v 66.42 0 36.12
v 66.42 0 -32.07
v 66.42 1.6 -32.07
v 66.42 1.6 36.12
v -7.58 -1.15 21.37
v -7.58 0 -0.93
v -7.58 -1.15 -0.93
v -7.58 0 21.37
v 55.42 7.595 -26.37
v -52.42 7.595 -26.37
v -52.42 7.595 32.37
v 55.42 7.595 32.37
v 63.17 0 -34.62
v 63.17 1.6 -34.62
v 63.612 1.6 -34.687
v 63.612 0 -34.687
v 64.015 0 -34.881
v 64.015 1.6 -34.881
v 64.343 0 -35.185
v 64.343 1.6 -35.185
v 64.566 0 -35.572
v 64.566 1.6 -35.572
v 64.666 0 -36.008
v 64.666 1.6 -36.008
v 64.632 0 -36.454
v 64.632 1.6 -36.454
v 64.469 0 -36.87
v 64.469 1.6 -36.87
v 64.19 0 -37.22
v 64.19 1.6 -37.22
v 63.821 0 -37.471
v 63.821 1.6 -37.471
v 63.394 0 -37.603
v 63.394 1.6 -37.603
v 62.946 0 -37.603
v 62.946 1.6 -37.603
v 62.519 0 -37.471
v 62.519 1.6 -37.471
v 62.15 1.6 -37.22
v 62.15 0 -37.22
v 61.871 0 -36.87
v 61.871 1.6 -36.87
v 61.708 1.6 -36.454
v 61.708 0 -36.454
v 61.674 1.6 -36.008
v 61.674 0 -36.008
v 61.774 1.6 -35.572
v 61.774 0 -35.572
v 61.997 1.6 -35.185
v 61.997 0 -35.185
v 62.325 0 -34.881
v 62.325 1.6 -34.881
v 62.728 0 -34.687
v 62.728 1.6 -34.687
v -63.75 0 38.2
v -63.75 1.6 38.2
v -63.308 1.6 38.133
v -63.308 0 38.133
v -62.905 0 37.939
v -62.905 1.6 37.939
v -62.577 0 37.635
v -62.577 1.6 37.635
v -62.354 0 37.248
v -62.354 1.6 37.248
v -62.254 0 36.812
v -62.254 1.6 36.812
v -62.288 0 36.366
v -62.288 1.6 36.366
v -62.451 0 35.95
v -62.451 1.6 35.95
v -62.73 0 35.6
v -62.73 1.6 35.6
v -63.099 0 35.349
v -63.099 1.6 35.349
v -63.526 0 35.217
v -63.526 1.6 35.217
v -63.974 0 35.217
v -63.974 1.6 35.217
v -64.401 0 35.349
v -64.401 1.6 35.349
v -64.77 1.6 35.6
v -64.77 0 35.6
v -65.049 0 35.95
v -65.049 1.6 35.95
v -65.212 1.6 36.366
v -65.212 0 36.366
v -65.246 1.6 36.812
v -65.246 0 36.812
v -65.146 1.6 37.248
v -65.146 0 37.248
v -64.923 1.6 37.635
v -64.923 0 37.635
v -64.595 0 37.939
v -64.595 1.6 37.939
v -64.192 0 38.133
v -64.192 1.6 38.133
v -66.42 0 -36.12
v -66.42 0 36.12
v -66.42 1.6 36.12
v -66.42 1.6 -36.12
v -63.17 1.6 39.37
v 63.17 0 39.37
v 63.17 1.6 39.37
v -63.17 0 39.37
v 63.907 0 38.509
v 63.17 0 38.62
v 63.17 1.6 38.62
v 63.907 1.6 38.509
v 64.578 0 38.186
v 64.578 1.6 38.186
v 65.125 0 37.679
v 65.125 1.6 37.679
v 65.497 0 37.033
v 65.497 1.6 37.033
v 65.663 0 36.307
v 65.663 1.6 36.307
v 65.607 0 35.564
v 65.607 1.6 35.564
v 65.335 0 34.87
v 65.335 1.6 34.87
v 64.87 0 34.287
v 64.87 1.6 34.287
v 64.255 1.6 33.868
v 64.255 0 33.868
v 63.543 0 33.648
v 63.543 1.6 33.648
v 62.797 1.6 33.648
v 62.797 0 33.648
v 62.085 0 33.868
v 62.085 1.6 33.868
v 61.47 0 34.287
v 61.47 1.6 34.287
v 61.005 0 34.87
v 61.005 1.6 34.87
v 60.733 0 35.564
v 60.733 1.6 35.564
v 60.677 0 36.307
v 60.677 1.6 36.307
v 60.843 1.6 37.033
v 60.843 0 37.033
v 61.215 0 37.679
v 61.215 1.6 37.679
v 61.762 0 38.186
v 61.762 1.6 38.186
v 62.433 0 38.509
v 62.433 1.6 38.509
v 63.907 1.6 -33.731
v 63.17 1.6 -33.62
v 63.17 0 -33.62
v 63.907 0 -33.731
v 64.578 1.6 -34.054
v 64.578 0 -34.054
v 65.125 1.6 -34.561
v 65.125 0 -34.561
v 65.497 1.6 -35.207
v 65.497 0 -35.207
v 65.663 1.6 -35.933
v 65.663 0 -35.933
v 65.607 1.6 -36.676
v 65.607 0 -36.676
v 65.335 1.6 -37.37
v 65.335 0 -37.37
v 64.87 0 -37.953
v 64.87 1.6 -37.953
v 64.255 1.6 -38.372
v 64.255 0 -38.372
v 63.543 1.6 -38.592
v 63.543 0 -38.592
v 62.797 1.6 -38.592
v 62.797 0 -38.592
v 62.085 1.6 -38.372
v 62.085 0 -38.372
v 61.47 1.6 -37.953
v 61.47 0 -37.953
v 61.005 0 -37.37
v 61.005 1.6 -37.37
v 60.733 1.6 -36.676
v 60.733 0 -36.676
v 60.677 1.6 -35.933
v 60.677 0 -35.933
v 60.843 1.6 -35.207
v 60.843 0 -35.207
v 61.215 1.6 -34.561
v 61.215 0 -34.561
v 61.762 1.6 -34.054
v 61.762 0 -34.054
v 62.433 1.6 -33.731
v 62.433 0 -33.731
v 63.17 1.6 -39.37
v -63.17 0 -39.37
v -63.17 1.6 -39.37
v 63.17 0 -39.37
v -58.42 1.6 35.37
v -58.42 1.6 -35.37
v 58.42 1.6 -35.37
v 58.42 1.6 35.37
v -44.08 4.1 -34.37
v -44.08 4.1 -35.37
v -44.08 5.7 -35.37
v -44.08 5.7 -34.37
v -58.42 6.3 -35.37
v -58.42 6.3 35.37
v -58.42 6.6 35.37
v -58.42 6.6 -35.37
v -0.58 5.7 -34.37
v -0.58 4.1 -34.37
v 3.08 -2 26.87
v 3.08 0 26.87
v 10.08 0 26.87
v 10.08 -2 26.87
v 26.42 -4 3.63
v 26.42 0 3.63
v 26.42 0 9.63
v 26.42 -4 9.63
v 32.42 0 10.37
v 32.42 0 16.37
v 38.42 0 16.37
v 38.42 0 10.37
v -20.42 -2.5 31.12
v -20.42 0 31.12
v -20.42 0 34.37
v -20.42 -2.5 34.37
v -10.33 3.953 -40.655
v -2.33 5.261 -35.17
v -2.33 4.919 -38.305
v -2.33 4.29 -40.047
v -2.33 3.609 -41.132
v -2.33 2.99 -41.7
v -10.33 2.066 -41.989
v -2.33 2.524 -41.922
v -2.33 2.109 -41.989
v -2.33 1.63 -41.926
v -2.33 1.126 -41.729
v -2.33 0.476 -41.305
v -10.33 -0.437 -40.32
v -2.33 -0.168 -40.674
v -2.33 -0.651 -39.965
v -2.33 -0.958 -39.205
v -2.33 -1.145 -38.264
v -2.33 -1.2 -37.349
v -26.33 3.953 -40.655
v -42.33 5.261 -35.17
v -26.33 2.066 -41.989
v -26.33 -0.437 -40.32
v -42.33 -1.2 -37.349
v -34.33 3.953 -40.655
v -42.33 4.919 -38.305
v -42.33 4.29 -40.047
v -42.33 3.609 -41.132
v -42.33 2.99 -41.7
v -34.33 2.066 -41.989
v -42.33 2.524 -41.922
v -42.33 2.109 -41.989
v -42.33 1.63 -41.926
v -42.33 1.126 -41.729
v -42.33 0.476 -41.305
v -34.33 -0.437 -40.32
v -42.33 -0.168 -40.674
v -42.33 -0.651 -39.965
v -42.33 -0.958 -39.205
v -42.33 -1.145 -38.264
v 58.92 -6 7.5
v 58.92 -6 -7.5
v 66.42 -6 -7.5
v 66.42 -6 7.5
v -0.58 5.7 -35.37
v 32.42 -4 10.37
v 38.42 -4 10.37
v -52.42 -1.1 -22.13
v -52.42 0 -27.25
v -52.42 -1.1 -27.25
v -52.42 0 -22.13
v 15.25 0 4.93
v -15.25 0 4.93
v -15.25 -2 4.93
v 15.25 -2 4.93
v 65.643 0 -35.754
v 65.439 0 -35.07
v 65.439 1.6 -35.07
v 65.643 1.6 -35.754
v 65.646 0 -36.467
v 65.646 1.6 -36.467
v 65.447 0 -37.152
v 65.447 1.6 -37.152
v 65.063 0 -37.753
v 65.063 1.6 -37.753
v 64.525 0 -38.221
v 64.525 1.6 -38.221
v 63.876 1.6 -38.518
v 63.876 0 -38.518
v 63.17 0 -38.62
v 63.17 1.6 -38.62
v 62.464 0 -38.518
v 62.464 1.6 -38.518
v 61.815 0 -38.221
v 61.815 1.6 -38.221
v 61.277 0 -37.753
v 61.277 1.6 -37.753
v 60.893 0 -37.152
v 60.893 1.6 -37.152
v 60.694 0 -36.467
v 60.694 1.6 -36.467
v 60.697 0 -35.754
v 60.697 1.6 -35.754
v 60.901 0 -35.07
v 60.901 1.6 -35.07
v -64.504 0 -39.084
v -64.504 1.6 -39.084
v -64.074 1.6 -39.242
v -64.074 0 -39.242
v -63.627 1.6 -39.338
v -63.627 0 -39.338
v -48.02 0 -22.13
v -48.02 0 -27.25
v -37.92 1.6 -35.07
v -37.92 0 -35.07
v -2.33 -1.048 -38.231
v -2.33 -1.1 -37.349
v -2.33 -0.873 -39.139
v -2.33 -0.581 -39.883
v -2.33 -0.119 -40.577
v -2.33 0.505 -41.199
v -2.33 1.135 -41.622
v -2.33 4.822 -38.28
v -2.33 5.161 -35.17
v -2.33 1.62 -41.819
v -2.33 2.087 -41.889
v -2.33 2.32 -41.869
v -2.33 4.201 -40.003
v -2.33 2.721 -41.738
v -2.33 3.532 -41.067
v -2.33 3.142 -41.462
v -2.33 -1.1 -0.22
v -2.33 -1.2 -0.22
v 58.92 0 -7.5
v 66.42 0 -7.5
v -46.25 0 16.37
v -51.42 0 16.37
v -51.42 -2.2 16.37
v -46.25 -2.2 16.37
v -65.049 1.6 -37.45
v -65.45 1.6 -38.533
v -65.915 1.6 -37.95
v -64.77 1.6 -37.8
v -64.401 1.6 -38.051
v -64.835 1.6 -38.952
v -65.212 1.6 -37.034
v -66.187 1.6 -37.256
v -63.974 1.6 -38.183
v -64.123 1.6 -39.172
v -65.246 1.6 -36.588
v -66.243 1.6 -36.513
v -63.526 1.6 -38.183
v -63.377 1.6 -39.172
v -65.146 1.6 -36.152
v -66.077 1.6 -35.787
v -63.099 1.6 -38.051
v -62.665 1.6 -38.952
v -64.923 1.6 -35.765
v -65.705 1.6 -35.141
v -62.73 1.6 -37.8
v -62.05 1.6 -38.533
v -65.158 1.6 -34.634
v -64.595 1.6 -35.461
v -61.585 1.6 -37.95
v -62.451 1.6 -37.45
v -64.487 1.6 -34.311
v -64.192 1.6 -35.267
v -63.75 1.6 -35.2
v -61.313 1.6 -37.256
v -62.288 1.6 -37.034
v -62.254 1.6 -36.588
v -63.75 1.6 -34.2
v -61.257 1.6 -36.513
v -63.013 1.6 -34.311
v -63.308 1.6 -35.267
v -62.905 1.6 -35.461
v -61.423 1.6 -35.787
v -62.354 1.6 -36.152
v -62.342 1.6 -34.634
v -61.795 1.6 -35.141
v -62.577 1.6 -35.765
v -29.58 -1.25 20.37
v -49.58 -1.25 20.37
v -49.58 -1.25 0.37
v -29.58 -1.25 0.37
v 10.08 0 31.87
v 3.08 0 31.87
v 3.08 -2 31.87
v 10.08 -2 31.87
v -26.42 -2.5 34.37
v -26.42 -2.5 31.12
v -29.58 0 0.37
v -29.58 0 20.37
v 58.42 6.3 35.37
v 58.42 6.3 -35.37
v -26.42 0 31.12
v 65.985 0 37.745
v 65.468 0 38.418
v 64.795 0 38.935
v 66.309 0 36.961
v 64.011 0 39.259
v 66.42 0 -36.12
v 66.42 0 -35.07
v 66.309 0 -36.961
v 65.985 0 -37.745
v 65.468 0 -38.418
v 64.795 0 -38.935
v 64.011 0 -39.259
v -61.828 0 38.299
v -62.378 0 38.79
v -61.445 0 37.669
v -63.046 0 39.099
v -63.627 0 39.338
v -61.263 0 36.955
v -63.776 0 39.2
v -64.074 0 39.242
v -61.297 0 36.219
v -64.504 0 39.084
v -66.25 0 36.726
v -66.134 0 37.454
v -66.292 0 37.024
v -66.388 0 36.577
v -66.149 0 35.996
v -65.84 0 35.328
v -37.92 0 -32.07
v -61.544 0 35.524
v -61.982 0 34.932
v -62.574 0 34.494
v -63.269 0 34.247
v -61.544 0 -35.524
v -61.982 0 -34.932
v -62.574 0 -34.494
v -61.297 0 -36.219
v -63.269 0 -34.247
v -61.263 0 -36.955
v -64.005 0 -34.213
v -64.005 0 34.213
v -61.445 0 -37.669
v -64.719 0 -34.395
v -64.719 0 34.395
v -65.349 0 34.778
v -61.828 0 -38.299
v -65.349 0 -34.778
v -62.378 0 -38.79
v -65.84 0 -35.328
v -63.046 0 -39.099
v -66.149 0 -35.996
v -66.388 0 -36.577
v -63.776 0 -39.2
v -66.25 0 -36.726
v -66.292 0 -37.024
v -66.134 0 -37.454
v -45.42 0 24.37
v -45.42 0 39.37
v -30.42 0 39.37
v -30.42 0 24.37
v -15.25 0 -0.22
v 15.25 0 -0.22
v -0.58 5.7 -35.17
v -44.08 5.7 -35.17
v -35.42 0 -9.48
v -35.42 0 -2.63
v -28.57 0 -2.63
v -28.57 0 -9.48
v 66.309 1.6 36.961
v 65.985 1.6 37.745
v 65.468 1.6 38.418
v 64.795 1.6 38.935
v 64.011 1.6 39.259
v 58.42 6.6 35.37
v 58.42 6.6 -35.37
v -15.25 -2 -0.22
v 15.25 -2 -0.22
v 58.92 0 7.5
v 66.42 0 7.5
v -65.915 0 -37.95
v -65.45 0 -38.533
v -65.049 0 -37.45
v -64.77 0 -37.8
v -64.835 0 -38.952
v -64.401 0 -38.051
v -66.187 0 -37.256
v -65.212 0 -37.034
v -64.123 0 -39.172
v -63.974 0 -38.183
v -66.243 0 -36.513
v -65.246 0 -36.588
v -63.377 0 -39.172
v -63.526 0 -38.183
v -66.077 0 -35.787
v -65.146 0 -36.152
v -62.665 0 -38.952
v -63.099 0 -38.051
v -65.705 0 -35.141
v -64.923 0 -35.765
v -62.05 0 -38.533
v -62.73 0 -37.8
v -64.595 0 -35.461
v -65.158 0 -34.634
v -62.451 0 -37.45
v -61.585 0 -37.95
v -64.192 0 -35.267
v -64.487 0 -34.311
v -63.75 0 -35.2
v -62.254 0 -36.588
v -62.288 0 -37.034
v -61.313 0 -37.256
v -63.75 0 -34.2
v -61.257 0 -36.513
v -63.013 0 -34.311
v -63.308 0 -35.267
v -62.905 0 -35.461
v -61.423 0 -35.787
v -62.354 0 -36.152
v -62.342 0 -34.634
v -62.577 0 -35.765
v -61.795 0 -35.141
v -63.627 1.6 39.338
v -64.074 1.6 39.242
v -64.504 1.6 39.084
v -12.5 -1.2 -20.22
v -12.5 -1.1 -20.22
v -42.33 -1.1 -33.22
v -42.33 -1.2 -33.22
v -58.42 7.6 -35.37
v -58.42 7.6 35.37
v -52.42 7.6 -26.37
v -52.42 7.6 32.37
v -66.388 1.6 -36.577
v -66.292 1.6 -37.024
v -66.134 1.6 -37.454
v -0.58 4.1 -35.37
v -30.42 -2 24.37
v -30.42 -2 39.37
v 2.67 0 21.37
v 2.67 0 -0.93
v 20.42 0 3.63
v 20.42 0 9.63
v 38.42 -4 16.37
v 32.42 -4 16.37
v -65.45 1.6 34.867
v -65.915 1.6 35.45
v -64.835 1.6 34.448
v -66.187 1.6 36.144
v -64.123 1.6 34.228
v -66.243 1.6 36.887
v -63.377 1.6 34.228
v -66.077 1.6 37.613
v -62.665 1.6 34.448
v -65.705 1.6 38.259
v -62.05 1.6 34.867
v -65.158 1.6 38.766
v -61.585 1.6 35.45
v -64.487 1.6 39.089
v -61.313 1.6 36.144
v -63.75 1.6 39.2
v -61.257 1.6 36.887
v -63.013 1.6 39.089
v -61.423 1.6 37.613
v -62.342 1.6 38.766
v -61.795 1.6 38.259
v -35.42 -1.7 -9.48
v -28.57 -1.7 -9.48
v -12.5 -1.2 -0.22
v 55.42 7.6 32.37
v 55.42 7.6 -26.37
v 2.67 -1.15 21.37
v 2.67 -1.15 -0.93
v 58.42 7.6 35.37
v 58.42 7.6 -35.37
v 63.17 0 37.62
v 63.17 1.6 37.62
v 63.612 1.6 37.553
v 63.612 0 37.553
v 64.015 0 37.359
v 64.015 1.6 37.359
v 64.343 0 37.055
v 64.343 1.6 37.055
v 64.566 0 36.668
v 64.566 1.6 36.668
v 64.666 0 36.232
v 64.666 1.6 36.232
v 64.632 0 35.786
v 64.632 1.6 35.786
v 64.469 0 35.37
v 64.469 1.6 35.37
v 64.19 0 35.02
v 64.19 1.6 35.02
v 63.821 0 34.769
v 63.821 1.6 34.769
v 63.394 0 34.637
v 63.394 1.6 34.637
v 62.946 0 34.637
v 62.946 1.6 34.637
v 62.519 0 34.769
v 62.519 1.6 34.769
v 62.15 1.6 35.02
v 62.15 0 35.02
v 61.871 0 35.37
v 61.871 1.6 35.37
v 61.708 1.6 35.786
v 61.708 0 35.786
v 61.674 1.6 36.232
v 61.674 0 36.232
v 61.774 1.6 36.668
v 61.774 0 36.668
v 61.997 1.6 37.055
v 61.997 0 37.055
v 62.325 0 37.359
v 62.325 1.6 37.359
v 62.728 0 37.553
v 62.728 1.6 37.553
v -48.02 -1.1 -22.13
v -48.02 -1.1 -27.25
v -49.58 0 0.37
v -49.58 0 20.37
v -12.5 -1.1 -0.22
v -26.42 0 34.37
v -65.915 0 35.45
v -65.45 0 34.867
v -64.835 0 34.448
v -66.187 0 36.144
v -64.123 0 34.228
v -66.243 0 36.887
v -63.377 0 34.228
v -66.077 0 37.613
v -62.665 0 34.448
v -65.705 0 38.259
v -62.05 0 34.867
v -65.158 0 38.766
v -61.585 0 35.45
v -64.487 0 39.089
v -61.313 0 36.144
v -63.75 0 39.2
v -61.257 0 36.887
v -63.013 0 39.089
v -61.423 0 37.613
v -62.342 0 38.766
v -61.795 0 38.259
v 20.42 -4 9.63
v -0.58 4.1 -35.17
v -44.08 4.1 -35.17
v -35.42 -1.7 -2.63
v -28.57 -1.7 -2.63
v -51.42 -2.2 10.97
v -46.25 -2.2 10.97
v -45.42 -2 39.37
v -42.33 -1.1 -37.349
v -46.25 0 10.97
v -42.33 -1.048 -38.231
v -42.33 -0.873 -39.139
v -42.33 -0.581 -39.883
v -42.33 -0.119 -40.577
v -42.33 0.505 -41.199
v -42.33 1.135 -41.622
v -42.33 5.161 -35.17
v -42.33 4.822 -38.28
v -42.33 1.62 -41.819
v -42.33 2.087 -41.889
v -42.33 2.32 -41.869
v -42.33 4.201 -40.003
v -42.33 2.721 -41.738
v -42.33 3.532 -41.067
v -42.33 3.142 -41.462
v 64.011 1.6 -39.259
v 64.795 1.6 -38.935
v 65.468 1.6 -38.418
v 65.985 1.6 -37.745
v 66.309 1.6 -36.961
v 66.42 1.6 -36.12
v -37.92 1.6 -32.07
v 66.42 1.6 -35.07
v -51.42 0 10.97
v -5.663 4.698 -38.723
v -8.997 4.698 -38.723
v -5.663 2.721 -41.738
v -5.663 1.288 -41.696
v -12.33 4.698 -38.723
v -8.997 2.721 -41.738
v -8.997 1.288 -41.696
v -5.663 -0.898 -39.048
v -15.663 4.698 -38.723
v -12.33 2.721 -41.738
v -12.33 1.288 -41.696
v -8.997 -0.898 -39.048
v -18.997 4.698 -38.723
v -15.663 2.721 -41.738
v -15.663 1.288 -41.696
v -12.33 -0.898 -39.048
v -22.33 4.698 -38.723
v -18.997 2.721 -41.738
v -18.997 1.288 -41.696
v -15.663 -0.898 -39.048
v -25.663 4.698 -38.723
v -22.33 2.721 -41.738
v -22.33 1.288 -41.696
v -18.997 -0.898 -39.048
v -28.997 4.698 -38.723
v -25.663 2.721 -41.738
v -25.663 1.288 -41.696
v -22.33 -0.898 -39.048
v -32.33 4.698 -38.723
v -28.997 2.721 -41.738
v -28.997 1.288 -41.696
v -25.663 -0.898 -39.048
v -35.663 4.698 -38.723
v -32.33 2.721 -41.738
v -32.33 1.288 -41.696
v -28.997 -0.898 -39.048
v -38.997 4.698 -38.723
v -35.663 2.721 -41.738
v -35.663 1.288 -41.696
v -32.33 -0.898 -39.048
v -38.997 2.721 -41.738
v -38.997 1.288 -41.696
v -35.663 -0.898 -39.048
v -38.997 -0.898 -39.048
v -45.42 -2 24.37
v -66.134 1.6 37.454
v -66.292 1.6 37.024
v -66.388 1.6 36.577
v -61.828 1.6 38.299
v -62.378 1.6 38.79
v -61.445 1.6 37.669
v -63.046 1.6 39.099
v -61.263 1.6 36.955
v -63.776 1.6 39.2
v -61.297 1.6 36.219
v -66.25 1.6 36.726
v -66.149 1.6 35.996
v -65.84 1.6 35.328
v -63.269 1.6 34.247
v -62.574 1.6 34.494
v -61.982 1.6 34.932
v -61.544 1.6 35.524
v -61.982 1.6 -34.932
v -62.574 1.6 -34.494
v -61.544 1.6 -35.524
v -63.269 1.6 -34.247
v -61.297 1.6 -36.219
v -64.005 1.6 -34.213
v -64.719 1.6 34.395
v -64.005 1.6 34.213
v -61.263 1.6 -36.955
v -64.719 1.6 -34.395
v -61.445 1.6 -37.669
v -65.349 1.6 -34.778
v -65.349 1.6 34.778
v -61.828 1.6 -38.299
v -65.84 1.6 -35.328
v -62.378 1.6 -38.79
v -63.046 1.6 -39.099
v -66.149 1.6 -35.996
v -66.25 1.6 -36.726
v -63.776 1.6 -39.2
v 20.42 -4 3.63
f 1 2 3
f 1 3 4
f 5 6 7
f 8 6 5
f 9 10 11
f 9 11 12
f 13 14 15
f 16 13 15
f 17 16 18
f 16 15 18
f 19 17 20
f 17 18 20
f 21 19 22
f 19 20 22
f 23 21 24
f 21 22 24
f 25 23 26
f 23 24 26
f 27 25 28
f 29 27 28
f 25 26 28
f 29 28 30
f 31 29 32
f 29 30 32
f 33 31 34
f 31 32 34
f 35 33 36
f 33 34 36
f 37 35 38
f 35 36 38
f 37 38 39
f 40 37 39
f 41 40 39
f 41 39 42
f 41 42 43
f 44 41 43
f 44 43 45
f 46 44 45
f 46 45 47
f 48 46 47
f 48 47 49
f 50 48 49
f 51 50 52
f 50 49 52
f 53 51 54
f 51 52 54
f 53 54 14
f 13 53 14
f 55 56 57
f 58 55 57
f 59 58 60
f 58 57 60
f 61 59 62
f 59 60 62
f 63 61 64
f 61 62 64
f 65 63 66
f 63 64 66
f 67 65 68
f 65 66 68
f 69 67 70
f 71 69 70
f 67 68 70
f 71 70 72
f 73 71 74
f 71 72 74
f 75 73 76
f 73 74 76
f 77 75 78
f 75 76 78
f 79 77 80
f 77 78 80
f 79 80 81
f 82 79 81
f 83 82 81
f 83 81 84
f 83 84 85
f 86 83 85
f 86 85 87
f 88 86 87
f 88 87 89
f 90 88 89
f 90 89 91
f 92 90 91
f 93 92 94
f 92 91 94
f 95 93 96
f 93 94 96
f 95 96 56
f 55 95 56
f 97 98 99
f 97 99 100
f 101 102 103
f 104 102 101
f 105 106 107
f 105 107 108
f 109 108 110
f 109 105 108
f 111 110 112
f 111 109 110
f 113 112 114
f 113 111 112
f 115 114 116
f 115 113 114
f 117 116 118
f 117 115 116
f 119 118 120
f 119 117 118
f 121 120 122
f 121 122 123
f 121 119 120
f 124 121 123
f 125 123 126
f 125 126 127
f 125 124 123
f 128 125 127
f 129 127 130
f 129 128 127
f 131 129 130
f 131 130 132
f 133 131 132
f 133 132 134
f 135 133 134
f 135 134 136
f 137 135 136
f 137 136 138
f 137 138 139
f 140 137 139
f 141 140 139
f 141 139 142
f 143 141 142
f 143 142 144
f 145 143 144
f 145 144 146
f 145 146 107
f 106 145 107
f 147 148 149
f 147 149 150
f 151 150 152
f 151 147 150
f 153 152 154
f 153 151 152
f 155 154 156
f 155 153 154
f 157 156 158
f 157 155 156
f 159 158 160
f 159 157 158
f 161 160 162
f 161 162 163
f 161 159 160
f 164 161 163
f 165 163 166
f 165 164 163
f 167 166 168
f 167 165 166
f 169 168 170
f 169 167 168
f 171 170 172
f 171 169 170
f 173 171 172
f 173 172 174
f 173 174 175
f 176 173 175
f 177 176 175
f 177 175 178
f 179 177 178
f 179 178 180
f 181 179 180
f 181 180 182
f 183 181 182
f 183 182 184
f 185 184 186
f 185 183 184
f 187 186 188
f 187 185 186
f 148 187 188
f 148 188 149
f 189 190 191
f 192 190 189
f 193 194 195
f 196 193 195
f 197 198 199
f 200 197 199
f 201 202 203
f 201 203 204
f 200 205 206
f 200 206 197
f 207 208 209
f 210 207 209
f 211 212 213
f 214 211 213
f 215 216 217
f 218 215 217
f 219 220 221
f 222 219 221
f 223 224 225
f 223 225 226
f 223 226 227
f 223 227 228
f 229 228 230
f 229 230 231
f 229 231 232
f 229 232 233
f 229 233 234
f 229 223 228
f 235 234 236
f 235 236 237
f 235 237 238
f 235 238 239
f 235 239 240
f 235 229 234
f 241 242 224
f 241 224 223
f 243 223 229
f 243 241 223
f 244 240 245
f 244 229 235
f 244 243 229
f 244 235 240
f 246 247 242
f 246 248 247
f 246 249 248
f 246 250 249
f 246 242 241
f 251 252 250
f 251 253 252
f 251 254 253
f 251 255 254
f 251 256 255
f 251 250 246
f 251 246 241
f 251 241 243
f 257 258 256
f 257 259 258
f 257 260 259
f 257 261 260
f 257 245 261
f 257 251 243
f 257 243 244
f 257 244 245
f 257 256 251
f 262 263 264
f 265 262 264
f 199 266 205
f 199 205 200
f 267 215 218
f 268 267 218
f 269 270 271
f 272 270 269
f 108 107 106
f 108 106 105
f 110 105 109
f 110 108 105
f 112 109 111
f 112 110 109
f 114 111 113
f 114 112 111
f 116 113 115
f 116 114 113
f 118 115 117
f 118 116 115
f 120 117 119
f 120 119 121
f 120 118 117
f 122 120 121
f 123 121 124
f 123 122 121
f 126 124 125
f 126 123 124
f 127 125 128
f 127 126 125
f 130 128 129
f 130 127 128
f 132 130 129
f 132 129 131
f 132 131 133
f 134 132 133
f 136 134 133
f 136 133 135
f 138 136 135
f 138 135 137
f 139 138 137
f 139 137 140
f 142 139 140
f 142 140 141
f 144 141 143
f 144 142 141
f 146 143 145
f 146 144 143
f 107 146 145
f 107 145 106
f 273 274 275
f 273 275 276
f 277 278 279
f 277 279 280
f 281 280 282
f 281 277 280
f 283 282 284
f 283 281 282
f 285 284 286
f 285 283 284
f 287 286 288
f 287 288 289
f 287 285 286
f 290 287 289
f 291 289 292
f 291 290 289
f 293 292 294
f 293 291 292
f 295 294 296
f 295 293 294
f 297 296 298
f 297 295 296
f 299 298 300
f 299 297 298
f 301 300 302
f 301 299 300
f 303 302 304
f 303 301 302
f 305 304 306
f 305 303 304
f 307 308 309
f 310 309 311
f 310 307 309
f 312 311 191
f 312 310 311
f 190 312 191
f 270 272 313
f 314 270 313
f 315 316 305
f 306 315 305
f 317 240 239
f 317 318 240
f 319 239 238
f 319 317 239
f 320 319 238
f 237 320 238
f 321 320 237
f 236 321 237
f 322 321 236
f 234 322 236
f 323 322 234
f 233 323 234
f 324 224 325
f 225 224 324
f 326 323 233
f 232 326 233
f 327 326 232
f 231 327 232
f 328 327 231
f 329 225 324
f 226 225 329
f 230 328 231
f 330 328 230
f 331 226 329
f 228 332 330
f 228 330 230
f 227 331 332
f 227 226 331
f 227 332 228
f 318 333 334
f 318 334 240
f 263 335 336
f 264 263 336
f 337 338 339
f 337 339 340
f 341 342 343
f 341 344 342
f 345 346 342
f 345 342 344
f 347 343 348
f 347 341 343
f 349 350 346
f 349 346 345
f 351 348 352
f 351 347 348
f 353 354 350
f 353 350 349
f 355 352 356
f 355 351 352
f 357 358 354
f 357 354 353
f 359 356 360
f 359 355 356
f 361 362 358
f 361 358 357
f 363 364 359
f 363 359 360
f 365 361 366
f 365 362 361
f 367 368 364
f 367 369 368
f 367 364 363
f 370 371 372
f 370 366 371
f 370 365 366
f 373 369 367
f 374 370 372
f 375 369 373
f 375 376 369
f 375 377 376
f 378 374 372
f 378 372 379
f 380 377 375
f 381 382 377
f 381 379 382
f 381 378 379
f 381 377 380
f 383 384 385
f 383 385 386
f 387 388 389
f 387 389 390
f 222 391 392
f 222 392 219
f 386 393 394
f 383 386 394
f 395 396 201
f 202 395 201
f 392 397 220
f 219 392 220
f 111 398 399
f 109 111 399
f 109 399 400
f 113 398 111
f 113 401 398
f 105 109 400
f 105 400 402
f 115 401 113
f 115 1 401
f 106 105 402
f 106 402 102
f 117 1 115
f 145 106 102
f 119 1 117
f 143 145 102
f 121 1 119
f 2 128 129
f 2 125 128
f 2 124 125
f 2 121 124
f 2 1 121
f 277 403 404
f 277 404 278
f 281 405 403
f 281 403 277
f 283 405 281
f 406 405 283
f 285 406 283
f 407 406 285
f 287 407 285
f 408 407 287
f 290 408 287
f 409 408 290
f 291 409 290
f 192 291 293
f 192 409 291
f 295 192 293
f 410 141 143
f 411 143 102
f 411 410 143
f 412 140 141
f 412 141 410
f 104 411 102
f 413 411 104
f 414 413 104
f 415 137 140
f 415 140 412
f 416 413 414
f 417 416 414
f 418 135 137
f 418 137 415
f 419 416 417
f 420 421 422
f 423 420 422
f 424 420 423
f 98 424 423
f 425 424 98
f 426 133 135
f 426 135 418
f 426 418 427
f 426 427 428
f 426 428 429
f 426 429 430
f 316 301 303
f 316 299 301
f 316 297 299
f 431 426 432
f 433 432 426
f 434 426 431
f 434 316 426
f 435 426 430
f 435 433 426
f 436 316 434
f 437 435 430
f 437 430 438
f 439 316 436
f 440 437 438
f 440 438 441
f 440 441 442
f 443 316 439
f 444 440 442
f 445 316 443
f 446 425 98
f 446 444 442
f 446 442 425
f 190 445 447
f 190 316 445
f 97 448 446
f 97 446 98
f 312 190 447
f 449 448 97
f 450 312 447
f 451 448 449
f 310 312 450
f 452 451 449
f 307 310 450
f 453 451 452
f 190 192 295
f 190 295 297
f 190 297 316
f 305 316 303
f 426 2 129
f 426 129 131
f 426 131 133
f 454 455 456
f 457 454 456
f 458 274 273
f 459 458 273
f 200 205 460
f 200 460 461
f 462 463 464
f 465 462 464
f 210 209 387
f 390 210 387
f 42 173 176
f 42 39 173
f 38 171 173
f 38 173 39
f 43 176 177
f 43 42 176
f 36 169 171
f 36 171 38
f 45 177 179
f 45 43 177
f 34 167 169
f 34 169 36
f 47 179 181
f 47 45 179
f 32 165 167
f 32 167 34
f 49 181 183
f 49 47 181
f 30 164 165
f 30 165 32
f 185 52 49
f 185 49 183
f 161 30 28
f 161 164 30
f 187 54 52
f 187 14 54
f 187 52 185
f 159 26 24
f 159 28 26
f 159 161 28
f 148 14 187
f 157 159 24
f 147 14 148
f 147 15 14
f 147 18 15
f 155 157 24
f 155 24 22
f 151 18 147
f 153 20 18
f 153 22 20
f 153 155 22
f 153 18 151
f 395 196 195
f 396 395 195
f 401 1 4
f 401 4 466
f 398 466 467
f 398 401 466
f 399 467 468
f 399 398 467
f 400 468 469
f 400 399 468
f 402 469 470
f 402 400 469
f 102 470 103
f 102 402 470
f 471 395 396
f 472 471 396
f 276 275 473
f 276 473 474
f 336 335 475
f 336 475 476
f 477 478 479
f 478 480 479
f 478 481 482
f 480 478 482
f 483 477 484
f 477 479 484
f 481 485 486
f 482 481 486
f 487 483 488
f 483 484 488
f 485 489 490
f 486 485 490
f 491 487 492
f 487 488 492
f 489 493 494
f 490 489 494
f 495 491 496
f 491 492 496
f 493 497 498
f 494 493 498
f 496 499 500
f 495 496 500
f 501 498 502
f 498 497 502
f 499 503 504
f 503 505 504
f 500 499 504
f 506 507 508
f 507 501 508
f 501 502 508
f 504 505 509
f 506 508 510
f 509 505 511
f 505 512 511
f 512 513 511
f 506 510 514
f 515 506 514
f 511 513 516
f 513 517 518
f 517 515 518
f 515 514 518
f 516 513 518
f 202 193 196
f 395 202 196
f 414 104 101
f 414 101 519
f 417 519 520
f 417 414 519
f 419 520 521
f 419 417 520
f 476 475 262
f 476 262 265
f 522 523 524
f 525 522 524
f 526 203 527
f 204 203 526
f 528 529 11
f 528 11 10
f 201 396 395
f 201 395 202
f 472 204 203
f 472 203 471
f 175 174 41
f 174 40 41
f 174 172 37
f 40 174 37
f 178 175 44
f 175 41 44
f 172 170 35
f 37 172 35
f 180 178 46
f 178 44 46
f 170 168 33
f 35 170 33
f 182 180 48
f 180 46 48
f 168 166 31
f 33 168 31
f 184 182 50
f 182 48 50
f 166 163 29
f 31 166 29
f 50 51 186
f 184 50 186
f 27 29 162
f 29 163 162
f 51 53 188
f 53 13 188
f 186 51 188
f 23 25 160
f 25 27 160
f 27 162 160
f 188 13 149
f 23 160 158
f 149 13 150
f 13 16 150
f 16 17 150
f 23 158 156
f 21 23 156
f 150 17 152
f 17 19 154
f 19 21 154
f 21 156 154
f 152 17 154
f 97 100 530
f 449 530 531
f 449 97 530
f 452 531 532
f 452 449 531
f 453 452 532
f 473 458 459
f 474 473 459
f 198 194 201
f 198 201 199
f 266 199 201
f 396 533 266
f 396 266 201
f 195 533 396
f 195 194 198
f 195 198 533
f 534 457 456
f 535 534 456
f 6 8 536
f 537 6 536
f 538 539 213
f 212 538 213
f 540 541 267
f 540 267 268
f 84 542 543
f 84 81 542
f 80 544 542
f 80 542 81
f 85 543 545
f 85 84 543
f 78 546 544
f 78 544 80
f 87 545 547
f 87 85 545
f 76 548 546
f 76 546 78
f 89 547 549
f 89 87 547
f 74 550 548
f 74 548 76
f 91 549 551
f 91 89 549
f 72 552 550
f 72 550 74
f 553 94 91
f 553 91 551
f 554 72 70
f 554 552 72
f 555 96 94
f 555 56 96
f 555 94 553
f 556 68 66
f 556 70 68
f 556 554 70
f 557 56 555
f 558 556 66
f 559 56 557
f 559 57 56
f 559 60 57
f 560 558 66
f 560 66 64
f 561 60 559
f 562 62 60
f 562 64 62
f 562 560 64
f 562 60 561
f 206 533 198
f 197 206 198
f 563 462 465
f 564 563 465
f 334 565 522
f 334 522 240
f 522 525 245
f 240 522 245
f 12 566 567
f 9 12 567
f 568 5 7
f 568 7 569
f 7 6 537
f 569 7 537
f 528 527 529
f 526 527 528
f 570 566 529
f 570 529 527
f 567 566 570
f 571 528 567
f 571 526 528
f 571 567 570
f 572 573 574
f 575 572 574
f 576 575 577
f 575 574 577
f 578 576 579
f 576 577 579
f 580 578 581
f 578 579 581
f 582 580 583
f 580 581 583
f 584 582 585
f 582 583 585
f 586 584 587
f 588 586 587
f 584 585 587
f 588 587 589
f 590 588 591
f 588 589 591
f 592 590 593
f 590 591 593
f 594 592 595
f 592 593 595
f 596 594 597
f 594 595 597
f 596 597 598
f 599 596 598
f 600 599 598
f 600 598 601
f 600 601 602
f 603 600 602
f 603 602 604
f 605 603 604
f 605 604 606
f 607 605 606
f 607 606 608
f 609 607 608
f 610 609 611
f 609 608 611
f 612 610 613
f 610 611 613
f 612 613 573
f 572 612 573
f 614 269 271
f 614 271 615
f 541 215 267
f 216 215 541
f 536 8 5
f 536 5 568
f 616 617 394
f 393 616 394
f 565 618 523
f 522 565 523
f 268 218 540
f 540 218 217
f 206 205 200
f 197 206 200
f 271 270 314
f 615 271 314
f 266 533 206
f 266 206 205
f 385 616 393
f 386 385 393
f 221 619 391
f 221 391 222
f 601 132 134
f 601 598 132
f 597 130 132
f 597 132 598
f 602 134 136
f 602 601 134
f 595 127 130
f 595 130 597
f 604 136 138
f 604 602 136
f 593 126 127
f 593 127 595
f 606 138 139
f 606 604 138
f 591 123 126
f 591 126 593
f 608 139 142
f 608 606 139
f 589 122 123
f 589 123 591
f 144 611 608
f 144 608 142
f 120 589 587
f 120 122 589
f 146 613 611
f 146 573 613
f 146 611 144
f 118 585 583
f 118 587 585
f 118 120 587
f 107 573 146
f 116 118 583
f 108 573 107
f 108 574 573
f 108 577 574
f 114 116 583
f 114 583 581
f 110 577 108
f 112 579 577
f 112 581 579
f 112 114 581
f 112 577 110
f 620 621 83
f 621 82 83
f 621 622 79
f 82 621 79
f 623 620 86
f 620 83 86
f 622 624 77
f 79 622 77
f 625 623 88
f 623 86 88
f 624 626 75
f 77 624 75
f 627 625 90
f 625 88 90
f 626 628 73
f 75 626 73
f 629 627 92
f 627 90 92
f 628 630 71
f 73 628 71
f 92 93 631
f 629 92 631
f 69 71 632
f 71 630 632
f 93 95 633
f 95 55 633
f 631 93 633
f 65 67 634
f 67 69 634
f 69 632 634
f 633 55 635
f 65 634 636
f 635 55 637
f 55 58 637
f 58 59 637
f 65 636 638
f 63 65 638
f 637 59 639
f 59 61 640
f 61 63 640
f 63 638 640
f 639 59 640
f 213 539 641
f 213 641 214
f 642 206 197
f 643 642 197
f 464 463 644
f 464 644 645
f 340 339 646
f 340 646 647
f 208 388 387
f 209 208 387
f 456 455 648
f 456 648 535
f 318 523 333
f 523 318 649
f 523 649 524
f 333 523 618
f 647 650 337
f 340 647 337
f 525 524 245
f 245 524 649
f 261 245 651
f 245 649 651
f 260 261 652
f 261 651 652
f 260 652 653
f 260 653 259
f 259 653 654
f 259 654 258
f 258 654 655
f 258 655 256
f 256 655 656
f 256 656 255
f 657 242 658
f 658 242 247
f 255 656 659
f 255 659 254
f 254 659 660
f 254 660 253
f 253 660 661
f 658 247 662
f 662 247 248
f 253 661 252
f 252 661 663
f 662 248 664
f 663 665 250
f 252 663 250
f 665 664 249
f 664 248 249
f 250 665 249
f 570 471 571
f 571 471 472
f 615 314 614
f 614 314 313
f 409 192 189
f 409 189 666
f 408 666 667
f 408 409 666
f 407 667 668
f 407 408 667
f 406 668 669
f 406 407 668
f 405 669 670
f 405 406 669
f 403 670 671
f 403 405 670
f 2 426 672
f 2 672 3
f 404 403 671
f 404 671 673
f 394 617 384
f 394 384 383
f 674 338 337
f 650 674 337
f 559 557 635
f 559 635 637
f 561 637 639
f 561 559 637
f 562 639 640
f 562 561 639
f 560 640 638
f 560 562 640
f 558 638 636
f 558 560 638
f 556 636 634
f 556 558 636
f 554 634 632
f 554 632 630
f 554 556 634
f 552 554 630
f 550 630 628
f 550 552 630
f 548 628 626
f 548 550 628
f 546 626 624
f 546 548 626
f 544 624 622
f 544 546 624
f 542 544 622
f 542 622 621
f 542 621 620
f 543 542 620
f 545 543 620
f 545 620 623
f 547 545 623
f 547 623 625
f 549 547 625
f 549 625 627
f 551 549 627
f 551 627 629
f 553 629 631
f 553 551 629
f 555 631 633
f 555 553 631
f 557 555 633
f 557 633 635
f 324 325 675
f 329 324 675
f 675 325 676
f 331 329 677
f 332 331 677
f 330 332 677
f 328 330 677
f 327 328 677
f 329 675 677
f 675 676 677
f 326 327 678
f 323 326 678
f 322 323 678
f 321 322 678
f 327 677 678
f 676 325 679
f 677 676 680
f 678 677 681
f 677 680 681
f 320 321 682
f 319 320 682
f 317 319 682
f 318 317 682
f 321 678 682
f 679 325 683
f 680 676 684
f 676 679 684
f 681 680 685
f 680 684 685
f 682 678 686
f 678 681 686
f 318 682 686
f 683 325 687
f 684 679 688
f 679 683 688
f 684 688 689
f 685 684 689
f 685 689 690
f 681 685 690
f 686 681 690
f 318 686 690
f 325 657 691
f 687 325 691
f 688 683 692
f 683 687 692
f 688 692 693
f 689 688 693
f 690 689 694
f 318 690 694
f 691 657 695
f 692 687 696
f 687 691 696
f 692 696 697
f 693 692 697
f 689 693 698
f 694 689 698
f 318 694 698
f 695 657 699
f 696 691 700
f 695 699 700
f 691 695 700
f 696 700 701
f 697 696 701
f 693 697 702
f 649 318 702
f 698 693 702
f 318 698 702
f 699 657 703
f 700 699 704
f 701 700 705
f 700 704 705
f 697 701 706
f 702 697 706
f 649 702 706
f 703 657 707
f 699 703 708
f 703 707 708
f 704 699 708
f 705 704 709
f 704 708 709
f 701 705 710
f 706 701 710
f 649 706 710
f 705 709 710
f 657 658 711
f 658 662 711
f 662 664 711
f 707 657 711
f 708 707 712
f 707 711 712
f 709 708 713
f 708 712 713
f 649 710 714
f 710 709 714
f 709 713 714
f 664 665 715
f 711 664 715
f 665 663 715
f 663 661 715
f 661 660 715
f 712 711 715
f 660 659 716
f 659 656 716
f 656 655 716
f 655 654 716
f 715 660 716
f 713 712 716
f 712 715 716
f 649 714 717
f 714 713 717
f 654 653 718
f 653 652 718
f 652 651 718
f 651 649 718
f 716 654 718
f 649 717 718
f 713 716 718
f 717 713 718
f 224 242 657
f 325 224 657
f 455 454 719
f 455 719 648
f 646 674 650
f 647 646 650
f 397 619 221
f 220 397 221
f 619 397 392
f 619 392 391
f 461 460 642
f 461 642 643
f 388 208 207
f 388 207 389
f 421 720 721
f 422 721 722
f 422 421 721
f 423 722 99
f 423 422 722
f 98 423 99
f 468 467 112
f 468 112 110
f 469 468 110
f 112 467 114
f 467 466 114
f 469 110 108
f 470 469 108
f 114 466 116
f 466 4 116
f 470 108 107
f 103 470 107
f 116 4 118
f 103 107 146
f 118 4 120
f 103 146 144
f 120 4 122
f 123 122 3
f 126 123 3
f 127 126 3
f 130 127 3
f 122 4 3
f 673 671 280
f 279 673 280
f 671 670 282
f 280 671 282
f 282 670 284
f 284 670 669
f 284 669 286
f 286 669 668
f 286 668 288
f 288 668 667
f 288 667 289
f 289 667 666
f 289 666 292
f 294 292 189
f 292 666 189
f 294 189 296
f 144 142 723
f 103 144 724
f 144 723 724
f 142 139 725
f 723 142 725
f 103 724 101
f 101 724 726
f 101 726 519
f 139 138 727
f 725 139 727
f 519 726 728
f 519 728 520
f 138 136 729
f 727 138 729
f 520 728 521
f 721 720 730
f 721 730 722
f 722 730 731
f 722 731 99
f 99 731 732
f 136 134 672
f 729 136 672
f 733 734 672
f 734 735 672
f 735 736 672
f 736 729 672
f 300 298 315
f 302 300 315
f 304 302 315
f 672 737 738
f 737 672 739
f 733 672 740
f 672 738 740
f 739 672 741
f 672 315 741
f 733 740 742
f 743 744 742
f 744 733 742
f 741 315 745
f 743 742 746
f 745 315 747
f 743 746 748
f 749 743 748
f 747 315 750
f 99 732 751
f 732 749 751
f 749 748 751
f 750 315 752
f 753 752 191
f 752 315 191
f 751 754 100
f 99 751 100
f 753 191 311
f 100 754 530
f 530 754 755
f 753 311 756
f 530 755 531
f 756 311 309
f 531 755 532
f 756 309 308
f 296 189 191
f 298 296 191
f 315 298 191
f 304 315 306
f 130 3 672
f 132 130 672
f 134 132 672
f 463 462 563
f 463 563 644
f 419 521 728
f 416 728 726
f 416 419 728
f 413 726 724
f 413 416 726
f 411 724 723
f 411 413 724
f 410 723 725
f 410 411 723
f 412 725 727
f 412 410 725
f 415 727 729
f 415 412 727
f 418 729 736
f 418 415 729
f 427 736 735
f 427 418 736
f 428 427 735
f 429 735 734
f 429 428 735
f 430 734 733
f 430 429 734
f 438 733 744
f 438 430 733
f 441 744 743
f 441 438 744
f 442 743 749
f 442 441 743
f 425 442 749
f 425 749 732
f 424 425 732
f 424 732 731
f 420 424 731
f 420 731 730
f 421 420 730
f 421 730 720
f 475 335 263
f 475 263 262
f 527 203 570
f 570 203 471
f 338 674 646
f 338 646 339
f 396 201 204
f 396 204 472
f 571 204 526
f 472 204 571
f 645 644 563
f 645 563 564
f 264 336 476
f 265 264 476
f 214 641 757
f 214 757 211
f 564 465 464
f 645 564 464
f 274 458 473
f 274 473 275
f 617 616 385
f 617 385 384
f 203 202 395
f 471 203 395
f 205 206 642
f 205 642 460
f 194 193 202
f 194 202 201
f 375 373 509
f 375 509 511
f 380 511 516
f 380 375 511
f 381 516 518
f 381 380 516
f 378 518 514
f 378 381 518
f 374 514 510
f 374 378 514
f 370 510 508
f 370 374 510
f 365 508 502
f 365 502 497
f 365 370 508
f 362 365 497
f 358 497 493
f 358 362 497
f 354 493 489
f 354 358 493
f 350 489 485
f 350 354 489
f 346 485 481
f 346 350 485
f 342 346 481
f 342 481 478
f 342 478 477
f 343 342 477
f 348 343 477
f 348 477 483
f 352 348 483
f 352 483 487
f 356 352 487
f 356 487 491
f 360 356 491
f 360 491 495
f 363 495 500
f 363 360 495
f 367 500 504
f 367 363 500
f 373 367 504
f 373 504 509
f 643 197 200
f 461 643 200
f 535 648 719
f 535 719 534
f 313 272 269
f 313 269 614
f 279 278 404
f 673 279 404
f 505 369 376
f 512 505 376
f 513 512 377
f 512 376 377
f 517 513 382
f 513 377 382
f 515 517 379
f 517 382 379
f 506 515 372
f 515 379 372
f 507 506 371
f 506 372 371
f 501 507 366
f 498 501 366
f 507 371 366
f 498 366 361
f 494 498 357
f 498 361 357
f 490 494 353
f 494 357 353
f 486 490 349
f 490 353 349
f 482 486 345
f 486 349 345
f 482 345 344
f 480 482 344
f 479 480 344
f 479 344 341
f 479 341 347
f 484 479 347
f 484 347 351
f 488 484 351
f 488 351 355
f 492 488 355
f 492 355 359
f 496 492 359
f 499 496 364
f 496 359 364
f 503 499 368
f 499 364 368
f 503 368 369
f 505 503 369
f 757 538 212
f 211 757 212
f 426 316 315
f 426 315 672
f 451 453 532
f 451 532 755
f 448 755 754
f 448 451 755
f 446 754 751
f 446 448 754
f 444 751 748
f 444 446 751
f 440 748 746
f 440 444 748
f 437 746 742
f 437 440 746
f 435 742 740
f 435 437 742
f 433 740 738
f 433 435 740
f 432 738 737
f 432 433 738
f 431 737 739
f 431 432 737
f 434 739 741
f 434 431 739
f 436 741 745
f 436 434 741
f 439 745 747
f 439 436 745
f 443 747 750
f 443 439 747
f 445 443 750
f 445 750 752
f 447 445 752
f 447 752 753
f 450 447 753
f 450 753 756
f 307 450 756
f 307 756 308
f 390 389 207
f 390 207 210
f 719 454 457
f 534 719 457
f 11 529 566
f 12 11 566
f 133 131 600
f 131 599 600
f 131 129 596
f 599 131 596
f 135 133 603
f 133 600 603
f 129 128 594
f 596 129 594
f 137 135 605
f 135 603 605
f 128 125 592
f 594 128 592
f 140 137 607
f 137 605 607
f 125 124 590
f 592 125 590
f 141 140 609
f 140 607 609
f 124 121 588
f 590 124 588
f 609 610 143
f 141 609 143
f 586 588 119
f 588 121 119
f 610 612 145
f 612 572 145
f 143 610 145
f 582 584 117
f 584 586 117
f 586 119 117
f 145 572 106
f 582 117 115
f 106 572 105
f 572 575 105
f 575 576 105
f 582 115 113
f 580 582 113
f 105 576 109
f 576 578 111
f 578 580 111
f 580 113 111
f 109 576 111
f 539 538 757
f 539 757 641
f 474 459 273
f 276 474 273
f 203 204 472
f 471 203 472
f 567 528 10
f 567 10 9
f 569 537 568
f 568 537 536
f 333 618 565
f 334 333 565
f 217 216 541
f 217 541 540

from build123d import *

# Parameters (mm, degrees)
SKETCH1_R                = 1.5
BOSS_EXTRUDE1_DEPTH      = 1.6
SKETCH2_W                = 116.84
SKETCH2_H                = 70.74
BOSS_EXTRUDE2_DEPTH      = 5
SKETCH3_W                = 116.84
SKETCH3_H                = 70.74
BOSS_EXTRUDE3_DEPTH      = 1
SKETCH4_W                = 7.5
SKETCH4_H                = 15
BOSS_EXTRUDE4_DEPTH      = 6
SKETCH5_W                = 15
SKETCH5_H                = 15
BOSS_EXTRUDE5_DEPTH      = 2
SKETCH6_W                = 107.84
SKETCH6_H                = 58.74
CUT_EXTRUDE1_DEPTH       = 0.005
CUT_EXTRUDE14_START      = -10
SKETCH39_R               = 2.5
SKETCH39_R_2             = 1.5
CUT_EXTRUDE14_DEPTH      = 10
SKETCH39_2_R             = 2.5
SKETCH39_2_R_2           = 1.5
BOSS_EXTRUDE18_DEPTH     = 1.6
BOSS_EXTRUDE18_2_DEPTH   = 1.6
BOSS_EXTRUDE18_3_DEPTH   = 1.6
BOSS_EXTRUDE18_4_DEPTH   = 1.6
SKETCH40_W               = 113
SKETCH40_H               = 3
CUT_EXTRUDE15_DEPTH      = 1.6
SPLIT1_SURFACE_1_1_BACK  = 156.021
SPLIT1_SURFACE_1_1_DEPTH = 312.042
SPLIT1_SURFACE_1_2_BACK  = 156.021
SPLIT1_SURFACE_1_2_DEPTH = 312.042
SKETCH43_W               = 20
SKETCH43_H               = 20
BOSS_EXTRUDE19_DEPTH     = 1.25
SKETCH43_3_W             = 10.25
SKETCH43_3_H             = 22.3
BOSS_EXTRUDE20_DEPTH     = 1.15
SKETCH43_5_W             = 6.85
SKETCH43_5_H             = 6.85
BOSS_EXTRUDE21_DEPTH     = 1.7
SKETCH43_6_W             = 5.17
SKETCH43_6_H             = 5.4
BOSS_EXTRUDE22_DEPTH     = 2.2
SKETCH43_7_W             = 4.4
SKETCH43_7_H             = 5.12
BOSS_EXTRUDE23_DEPTH     = 1.1
SKETCH52_W               = 43.5
SKETCH52_H               = 1.6
CUT_EXTRUDE19_DEPTH      = 1
SKETCH54_W               = 43.5
SKETCH54_H               = 1.6
BOSS_EXTRUDE28_DEPTH     = 0.8
SKETCH55_W               = 30.5
SKETCH55_H               = 5.15
BOSS_EXTRUDE29_DEPTH     = 2
EXTRUDE_THIN2_START      = -42.33
EXTRUDE_THIN2_DEPTH      = 40
CUT_EXTRUDE21_DEPTH      = 80.070285044
CUT_EXTRUDE21_DEPTH_BACK = 80.070285044
SKETCH43_9_W             = 7
SKETCH43_9_H             = 5
BOSS_EXTRUDE30_DEPTH     = 2
SKETCH43_10_W            = 6
SKETCH43_10_H            = 3.25
BOSS_EXTRUDE31_DEPTH     = 2.5
SKETCH58_W               = 6
SKETCH58_H               = 6
BOSS_EXTRUDE32_DEPTH     = 4
BOSS_EXTRUDE32_2_DEPTH   = 4


# Read off the part's stored shape, not the designer's step: Extrude-Thin2
with BuildPart() as part:
    # Sketch1 → Boss-Extrude1 (new body)
    with BuildSketch(Plane(origin=(0, 0, 0), x_dir=(1, 0, 0), z_dir=(0, 1, 0))):
        with BuildLine():
            Line((-63.17, 39.37), (63.17, 39.37))
            ThreePointArc((63.17, 39.37), (65.468097039, 38.418097039), (66.42, 36.12))
            Line((66.42, 36.12), (66.42, -36.12))
            ThreePointArc((66.42, -36.12), (65.468097039, -38.418097039), (63.17, -39.37))
            Line((63.17, -39.37), (-63.17, -39.37))
            ThreePointArc((-63.17, -39.37), (-65.468097039, -38.418097039), (-66.42, -36.12))
            Line((-66.42, -36.12), (-66.42, 36.12))
            ThreePointArc((-66.42, 36.12), (-65.468097039, 38.418097039), (-63.17, 39.37))
        make_face()
        with Locations(Location((-63.75, 36.7, 0), (0, 0, 270))):
            Circle(SKETCH1_R, mode=Mode.SUBTRACT)
        with Locations(Location((-63.75, -36.7, 0), (0, 0, 270))):
            Circle(SKETCH1_R, mode=Mode.SUBTRACT)
        with Locations(Location((63.17, -36.12, 0), (0, 0, 270))):
            Circle(SKETCH1_R, mode=Mode.SUBTRACT)
        with Locations(Location((63.17, 36.12, 0), (0, 0, 270))):
            Circle(SKETCH1_R, mode=Mode.SUBTRACT)
    extrude(amount=BOSS_EXTRUDE1_DEPTH)

    # Sketch39 → Cut-Extrude14 (cut)
    # profile 1 of 4: a face of its own
    with BuildSketch(Plane(origin=(0, 1.6, 0), x_dir=(1, 0, 0), z_dir=(0, 1, 0)).offset(CUT_EXTRUDE14_START)):
        with Locations(Location((63.17, -36.12, 0), (0, 0, 270))):
            Circle(SKETCH39_R)
        with Locations((63.17, -36.12)):
            Circle(SKETCH39_R_2, mode=Mode.SUBTRACT)
    # profile 2 of 4: a face of its own
    with BuildSketch(Plane(origin=(0, 1.6, 0), x_dir=(1, 0, 0), z_dir=(0, 1, 0)).offset(CUT_EXTRUDE14_START)):
        with Locations((-63.75, -36.7)):
            Circle(SKETCH39_R)
        with Locations((-63.75, -36.7)):
            Circle(SKETCH39_R_2, mode=Mode.SUBTRACT)
    # profile 3 of 4: a face of its own
    with BuildSketch(Plane(origin=(0, 1.6, 0), x_dir=(1, 0, 0), z_dir=(0, 1, 0)).offset(CUT_EXTRUDE14_START)):
        with Locations(Location((63.17, 36.12, 0), (0, 0, 270))):
            Circle(SKETCH39_R)
        with Locations((63.17, 36.12)):
            Circle(SKETCH39_R_2, mode=Mode.SUBTRACT)
    # profile 4 of 4: a face of its own
    with BuildSketch(Plane(origin=(0, 1.6, 0), x_dir=(1, 0, 0), z_dir=(0, 1, 0)).offset(CUT_EXTRUDE14_START)):
        with Locations((-63.75, 36.7)):
            Circle(SKETCH39_R)
        with Locations((-63.75, 36.7)):
            Circle(SKETCH39_R_2, mode=Mode.SUBTRACT)
    extrude(amount=CUT_EXTRUDE14_DEPTH, mode=Mode.SUBTRACT)

    # Sketch40 → Cut-Extrude15 (cut)
    with BuildSketch(Plane.XZ):
        with Locations((18.58, -33.57)):
            Rectangle(SKETCH40_W, SKETCH40_H)
    extrude(amount=-CUT_EXTRUDE15_DEPTH, mode=Mode.SUBTRACT)


with BuildPart() as body_2:
    # Sketch2 → Boss-Extrude2 (new body)
    with BuildSketch(Plane(origin=(0, 1.6, 0), x_dir=(1, 0, 0), z_dir=(0, 1, 0))):
        Rectangle(SKETCH2_W, SKETCH2_H)
    extrude(amount=BOSS_EXTRUDE2_DEPTH)


with BuildPart() as body_3:
    # Sketch3 → Boss-Extrude3 (new body)
    with BuildSketch(Plane(origin=(0, 6.6, 0), x_dir=(1, 0, 0), z_dir=(0, 1, 0))):
        Rectangle(SKETCH3_W, SKETCH3_H)
    extrude(amount=BOSS_EXTRUDE3_DEPTH)

    # Sketch6 → Cut-Extrude1 (cut)
    with BuildSketch(Plane(origin=(0, 7.6, 0), x_dir=(1, 0, 0), z_dir=(0, 1, 0))):
        with Locations((1.5, -3)):
            Rectangle(SKETCH6_W, SKETCH6_H)
    extrude(amount=-CUT_EXTRUDE1_DEPTH, mode=Mode.SUBTRACT)


with BuildPart() as body_4:
    # Sketch4 → Boss-Extrude4 (new body)
    with BuildSketch(Plane.XZ):
        with Locations((62.67, 0)):
            Rectangle(SKETCH4_W, SKETCH4_H)
    extrude(amount=BOSS_EXTRUDE4_DEPTH)


with BuildPart() as body_5:
    # Sketch5 → Boss-Extrude5 (new body)
    with BuildSketch(Plane.XZ):
        with Locations((-37.92, 31.87)):
            Rectangle(SKETCH5_W, SKETCH5_H)
    extrude(amount=BOSS_EXTRUDE5_DEPTH)


with BuildPart() as body_6:
    # Sketch39<2> → Boss-Extrude18 (new body)
    with BuildSketch(Plane(origin=(0, 1.6, 0), x_dir=(1, 0, 0), z_dir=(0, 1, 0))):
        with Locations(Location((63.17, -36.12, 0), (0, 0, 270))):
            Circle(SKETCH39_2_R)
        with Locations(Location((63.17, -36.12, 0), (0, 0, 270))):
            Circle(SKETCH39_2_R_2, mode=Mode.SUBTRACT)
    extrude(amount=-BOSS_EXTRUDE18_DEPTH)


with BuildPart() as body_7:
    # Sketch39<2> → Boss-Extrude18 2 (new body)
    with BuildSketch(Plane(origin=(0, 1.6, 0), x_dir=(1, 0, 0), z_dir=(0, 1, 0))):
        with Locations(Location((-63.75, -36.7, 0), (0, 0, 270))):
            Circle(SKETCH39_2_R)
        with Locations(Location((-63.75, -36.7, 0), (0, 0, 270))):
            Circle(SKETCH39_2_R_2, mode=Mode.SUBTRACT)
    extrude(amount=-BOSS_EXTRUDE18_2_DEPTH)


with BuildPart() as body_8:
    # Sketch39<2> → Boss-Extrude18 3 (new body)
    with BuildSketch(Plane(origin=(0, 1.6, 0), x_dir=(1, 0, 0), z_dir=(0, 1, 0))):
        with Locations(Location((63.17, 36.12, 0), (0, 0, 270))):
            Circle(SKETCH39_2_R)
        with Locations(Location((63.17, 36.12, 0), (0, 0, 270))):
            Circle(SKETCH39_2_R_2, mode=Mode.SUBTRACT)
    extrude(amount=-BOSS_EXTRUDE18_3_DEPTH)


with BuildPart() as body_9:
    # Sketch39<2> → Boss-Extrude18 4 (new body)
    with BuildSketch(Plane(origin=(0, 1.6, 0), x_dir=(1, 0, 0), z_dir=(0, 1, 0))):
        with Locations(Location((-63.75, 36.7, 0), (0, 0, 270))):
            Circle(SKETCH39_2_R)
        with Locations(Location((-63.75, 36.7, 0), (0, 0, 270))):
            Circle(SKETCH39_2_R_2, mode=Mode.SUBTRACT)
    extrude(amount=-BOSS_EXTRUDE18_4_DEPTH)


with BuildPart() as body_10:
    # Split1: the piece behind the surface
    add(body_2.part)
    # Split1 surface 1: a surface, the sketch's curves swept straight by 312.042 mm
    with BuildLine(Plane.XY.offset(-SPLIT1_SURFACE_1_1_BACK), mode=Mode.PRIVATE) as split1_surface_1_1_path:
        Line((58.42, 6.3), (-58.42, 6.3))
    split1_surface_1_1 = Shell.extrude(split1_surface_1_1_path.wire(), (0 * SPLIT1_SURFACE_1_1_DEPTH, 0 * SPLIT1_SURFACE_1_1_DEPTH, 1 * SPLIT1_SURFACE_1_1_DEPTH))
    split(bisect_by=split1_surface_1_1, keep=Keep.BOTTOM)


with BuildPart() as body_2_1:
    add(body_2.part)

    # Split1: split by a surface, the side it looks to stays
    # Split1 surface 1: a surface, the sketch's curves swept straight by 312.042 mm
    with BuildLine(Plane.XY.offset(-SPLIT1_SURFACE_1_2_BACK), mode=Mode.PRIVATE) as split1_surface_1_2_path:
        Line((58.42, 6.3), (-58.42, 6.3))
    split1_surface_1_2 = Shell.extrude(split1_surface_1_2_path.wire(), (0 * SPLIT1_SURFACE_1_2_DEPTH, 0 * SPLIT1_SURFACE_1_2_DEPTH, 1 * SPLIT1_SURFACE_1_2_DEPTH))
    split(bisect_by=split1_surface_1_2, keep=Keep.TOP)

    # Sketch52 → Cut-Extrude19 (cut)
    with BuildSketch(Plane(origin=(0, 0, -35.37), x_dir=(-1, 0, 0), z_dir=(0, 0, -1))):
        with Locations((22.33, 4.9)):
            Rectangle(SKETCH52_W, SKETCH52_H)
    extrude(amount=-CUT_EXTRUDE19_DEPTH, mode=Mode.SUBTRACT)


with BuildPart() as body_11_2:
    # Sketch43 → Boss-Extrude19 (new body)
    with BuildSketch(Plane.XZ):
        with Locations((-39.58, 10.37)):
            Rectangle(SKETCH43_W, SKETCH43_H)
    extrude(amount=BOSS_EXTRUDE19_DEPTH)


with BuildPart() as body_12:
    # Sketch43<3> → Boss-Extrude20 (new body)
    with BuildSketch(Plane.XZ):
        with Locations((-2.455, 10.22)):
            Rectangle(SKETCH43_3_W, SKETCH43_3_H)
    extrude(amount=BOSS_EXTRUDE20_DEPTH)


with BuildPart() as body_13:
    # Sketch43<5> → Boss-Extrude21 (new body)
    with BuildSketch(Plane.XZ):
        with Locations((-31.995, -6.055)):
            Rectangle(SKETCH43_5_W, SKETCH43_5_H)
    extrude(amount=BOSS_EXTRUDE21_DEPTH)


with BuildPart() as body_14:
    # Sketch43<6> → Boss-Extrude22 (new body)
    with BuildSketch(Plane.XZ):
        with Locations((-48.835, 13.67)):
            Rectangle(SKETCH43_6_W, SKETCH43_6_H)
    extrude(amount=BOSS_EXTRUDE22_DEPTH)


with BuildPart() as body_15:
    # Sketch43<7> → Boss-Extrude23 (new body)
    with BuildSketch(Plane.XZ):
        with Locations((-50.22, -24.69)):
            Rectangle(SKETCH43_7_W, SKETCH43_7_H)
    extrude(amount=BOSS_EXTRUDE23_DEPTH)


with BuildPart() as body_16:
    # Sketch54 → Boss-Extrude28 (new body)
    with BuildSketch(Plane(origin=(0, 0, -34.37), x_dir=(-1, 0, 0), z_dir=(0, 0, -1))):
        with Locations((22.33, 4.9)):
            Rectangle(SKETCH54_W, SKETCH54_H)
    extrude(amount=BOSS_EXTRUDE28_DEPTH)


with BuildPart() as body_17:
    # Sketch55 → Boss-Extrude29 (new body)
    with BuildSketch(Plane.XZ):
        with Locations((0, 2.355)):
            Rectangle(SKETCH55_W, SKETCH55_H)
    extrude(amount=BOSS_EXTRUDE29_DEPTH)


with BuildPart() as body_18:
    # Extrude-Thin2 outline → Extrude-Thin2 (new body)
    with BuildSketch(Plane(origin=(0, 0, 0), x_dir=(0, 0, -1), z_dir=(1, 0, 0)).offset(EXTRUDE_THIN2_START)):
        with BuildLine():
            Line((35.17, 5.261290846), (35.17, 5.161290846))
            add(Edge.make_bspline(
                [(35.17, 5.161290846), (35.626651814, 5.161290846), (36.178826319, 5.150606221), (37.088961556, 5.054864485), (37.405950632, 5.009669361), (38.056744399, 4.882169028), (38.391485376, 4.799245446), (39.386793624, 4.495952989), (40.037841142, 4.221056316), (41.109889237, 3.550895619), (41.528729594, 3.155598196), (41.84237371, 2.504232708), (41.89557611, 2.27801708), (41.880476896, 1.799797607), (41.812042886, 1.544233097), (41.464554394, 0.775988086), (41.043439085, 0.263843837), (40.453227691, -0.221080419), (40.33214952, -0.310285856), (40.087923435, -0.469979739), (39.964374463, -0.54084782), (39.586719752, -0.73009498), (39.325551535, -0.825182517), (38.492323962, -1.043543208), (37.864404223, -1.1), (37.349096065, -1.1)],
                knots=[0, 0, 0, 0, 0.125, 0.125, 0.1875, 0.1875, 0.25, 0.25, 0.375, 0.375, 0.5, 0.5, 0.5625, 0.5625, 0.625, 0.625, 0.75, 0.75, 0.78125, 0.78125, 0.8125, 0.8125, 0.875, 0.875, 1, 1, 1, 1], degree=3))
            Line((37.349096065, -1.1), (0.22, -1.1))
            Line((0.22, -1.1), (0.219999995, -1.2))
            Line((0.219999995, -1.2), (37.349096065, -1.2))
            add(Edge.make_bspline(
                [(35.17, 5.261290846), (35.881750528, 5.261290846), (38.615102871, 5.186858466), (43.317587332, 2.927570212), (40.814022251, -0.333951619), (38.987963428, -1.101147323), (37.858836202, -1.2), (37.349096065, -1.2)],
                knots=[0, 0, 0, 0, 0.194166953, 0.560069396, 0.776613346, 0.878062525, 1, 1, 1, 1], degree=3))
        make_face()
    extrude(amount=EXTRUDE_THIN2_DEPTH)

    # Sketch57 → Cut-Extrude21 (cut, two sides: drawn at the far end of the back side and taken through both)
    with BuildSketch(Plane.XZ.offset(1.2).offset(-CUT_EXTRUDE21_DEPTH_BACK)):
        Polygon((-2.33, -16.22), (12.5, -9.22), (12.5, -0.22), (-2.33, -0.22), align=None)
        Polygon((-12.5, -0.22), (-12.5, -20.22), (-42.33, -33.22), (-42.33, -0.22), align=None)
    extrude(amount=CUT_EXTRUDE21_DEPTH + CUT_EXTRUDE21_DEPTH_BACK, mode=Mode.SUBTRACT)


with BuildPart() as body_19:
    # Sketch43<9> → Boss-Extrude30 (new body)
    with BuildSketch(Plane.XZ):
        with Locations((6.58, 29.37)):
            Rectangle(SKETCH43_9_W, SKETCH43_9_H)
    extrude(amount=BOSS_EXTRUDE30_DEPTH)


with BuildPart() as body_20:
    # Sketch43<10> → Boss-Extrude31 (new body)
    with BuildSketch(Plane.XZ):
        with Locations((-23.42, 32.745)):
            Rectangle(SKETCH43_10_W, SKETCH43_10_H)
    extrude(amount=BOSS_EXTRUDE31_DEPTH)


with BuildPart() as body_21:
    # Sketch58 → Boss-Extrude32 (new body)
    with BuildSketch(Plane.XZ):
        with Locations((35.42, 13.37)):
            Rectangle(SKETCH58_W, SKETCH58_H)
    extrude(amount=BOSS_EXTRUDE32_DEPTH)


with BuildPart() as body_22:
    # Sketch58 → Boss-Extrude32 2 (new body)
    with BuildSketch(Plane.XZ):
        with Locations((23.42, 6.63)):
            Rectangle(SKETCH58_W, SKETCH58_H)
    extrude(amount=BOSS_EXTRUDE32_2_DEPTH)


solid = Compound([part.part, body_3.part, body_4.part, body_5.part, body_6.part, body_7.part, body_8.part, body_9.part, body_10.part, body_2_1.part, body_11_2.part, body_12.part, body_13.part, body_14.part, body_15.part, body_16.part, body_17.part, body_18.part, body_19.part, body_20.part, body_21.part, body_22.part])
